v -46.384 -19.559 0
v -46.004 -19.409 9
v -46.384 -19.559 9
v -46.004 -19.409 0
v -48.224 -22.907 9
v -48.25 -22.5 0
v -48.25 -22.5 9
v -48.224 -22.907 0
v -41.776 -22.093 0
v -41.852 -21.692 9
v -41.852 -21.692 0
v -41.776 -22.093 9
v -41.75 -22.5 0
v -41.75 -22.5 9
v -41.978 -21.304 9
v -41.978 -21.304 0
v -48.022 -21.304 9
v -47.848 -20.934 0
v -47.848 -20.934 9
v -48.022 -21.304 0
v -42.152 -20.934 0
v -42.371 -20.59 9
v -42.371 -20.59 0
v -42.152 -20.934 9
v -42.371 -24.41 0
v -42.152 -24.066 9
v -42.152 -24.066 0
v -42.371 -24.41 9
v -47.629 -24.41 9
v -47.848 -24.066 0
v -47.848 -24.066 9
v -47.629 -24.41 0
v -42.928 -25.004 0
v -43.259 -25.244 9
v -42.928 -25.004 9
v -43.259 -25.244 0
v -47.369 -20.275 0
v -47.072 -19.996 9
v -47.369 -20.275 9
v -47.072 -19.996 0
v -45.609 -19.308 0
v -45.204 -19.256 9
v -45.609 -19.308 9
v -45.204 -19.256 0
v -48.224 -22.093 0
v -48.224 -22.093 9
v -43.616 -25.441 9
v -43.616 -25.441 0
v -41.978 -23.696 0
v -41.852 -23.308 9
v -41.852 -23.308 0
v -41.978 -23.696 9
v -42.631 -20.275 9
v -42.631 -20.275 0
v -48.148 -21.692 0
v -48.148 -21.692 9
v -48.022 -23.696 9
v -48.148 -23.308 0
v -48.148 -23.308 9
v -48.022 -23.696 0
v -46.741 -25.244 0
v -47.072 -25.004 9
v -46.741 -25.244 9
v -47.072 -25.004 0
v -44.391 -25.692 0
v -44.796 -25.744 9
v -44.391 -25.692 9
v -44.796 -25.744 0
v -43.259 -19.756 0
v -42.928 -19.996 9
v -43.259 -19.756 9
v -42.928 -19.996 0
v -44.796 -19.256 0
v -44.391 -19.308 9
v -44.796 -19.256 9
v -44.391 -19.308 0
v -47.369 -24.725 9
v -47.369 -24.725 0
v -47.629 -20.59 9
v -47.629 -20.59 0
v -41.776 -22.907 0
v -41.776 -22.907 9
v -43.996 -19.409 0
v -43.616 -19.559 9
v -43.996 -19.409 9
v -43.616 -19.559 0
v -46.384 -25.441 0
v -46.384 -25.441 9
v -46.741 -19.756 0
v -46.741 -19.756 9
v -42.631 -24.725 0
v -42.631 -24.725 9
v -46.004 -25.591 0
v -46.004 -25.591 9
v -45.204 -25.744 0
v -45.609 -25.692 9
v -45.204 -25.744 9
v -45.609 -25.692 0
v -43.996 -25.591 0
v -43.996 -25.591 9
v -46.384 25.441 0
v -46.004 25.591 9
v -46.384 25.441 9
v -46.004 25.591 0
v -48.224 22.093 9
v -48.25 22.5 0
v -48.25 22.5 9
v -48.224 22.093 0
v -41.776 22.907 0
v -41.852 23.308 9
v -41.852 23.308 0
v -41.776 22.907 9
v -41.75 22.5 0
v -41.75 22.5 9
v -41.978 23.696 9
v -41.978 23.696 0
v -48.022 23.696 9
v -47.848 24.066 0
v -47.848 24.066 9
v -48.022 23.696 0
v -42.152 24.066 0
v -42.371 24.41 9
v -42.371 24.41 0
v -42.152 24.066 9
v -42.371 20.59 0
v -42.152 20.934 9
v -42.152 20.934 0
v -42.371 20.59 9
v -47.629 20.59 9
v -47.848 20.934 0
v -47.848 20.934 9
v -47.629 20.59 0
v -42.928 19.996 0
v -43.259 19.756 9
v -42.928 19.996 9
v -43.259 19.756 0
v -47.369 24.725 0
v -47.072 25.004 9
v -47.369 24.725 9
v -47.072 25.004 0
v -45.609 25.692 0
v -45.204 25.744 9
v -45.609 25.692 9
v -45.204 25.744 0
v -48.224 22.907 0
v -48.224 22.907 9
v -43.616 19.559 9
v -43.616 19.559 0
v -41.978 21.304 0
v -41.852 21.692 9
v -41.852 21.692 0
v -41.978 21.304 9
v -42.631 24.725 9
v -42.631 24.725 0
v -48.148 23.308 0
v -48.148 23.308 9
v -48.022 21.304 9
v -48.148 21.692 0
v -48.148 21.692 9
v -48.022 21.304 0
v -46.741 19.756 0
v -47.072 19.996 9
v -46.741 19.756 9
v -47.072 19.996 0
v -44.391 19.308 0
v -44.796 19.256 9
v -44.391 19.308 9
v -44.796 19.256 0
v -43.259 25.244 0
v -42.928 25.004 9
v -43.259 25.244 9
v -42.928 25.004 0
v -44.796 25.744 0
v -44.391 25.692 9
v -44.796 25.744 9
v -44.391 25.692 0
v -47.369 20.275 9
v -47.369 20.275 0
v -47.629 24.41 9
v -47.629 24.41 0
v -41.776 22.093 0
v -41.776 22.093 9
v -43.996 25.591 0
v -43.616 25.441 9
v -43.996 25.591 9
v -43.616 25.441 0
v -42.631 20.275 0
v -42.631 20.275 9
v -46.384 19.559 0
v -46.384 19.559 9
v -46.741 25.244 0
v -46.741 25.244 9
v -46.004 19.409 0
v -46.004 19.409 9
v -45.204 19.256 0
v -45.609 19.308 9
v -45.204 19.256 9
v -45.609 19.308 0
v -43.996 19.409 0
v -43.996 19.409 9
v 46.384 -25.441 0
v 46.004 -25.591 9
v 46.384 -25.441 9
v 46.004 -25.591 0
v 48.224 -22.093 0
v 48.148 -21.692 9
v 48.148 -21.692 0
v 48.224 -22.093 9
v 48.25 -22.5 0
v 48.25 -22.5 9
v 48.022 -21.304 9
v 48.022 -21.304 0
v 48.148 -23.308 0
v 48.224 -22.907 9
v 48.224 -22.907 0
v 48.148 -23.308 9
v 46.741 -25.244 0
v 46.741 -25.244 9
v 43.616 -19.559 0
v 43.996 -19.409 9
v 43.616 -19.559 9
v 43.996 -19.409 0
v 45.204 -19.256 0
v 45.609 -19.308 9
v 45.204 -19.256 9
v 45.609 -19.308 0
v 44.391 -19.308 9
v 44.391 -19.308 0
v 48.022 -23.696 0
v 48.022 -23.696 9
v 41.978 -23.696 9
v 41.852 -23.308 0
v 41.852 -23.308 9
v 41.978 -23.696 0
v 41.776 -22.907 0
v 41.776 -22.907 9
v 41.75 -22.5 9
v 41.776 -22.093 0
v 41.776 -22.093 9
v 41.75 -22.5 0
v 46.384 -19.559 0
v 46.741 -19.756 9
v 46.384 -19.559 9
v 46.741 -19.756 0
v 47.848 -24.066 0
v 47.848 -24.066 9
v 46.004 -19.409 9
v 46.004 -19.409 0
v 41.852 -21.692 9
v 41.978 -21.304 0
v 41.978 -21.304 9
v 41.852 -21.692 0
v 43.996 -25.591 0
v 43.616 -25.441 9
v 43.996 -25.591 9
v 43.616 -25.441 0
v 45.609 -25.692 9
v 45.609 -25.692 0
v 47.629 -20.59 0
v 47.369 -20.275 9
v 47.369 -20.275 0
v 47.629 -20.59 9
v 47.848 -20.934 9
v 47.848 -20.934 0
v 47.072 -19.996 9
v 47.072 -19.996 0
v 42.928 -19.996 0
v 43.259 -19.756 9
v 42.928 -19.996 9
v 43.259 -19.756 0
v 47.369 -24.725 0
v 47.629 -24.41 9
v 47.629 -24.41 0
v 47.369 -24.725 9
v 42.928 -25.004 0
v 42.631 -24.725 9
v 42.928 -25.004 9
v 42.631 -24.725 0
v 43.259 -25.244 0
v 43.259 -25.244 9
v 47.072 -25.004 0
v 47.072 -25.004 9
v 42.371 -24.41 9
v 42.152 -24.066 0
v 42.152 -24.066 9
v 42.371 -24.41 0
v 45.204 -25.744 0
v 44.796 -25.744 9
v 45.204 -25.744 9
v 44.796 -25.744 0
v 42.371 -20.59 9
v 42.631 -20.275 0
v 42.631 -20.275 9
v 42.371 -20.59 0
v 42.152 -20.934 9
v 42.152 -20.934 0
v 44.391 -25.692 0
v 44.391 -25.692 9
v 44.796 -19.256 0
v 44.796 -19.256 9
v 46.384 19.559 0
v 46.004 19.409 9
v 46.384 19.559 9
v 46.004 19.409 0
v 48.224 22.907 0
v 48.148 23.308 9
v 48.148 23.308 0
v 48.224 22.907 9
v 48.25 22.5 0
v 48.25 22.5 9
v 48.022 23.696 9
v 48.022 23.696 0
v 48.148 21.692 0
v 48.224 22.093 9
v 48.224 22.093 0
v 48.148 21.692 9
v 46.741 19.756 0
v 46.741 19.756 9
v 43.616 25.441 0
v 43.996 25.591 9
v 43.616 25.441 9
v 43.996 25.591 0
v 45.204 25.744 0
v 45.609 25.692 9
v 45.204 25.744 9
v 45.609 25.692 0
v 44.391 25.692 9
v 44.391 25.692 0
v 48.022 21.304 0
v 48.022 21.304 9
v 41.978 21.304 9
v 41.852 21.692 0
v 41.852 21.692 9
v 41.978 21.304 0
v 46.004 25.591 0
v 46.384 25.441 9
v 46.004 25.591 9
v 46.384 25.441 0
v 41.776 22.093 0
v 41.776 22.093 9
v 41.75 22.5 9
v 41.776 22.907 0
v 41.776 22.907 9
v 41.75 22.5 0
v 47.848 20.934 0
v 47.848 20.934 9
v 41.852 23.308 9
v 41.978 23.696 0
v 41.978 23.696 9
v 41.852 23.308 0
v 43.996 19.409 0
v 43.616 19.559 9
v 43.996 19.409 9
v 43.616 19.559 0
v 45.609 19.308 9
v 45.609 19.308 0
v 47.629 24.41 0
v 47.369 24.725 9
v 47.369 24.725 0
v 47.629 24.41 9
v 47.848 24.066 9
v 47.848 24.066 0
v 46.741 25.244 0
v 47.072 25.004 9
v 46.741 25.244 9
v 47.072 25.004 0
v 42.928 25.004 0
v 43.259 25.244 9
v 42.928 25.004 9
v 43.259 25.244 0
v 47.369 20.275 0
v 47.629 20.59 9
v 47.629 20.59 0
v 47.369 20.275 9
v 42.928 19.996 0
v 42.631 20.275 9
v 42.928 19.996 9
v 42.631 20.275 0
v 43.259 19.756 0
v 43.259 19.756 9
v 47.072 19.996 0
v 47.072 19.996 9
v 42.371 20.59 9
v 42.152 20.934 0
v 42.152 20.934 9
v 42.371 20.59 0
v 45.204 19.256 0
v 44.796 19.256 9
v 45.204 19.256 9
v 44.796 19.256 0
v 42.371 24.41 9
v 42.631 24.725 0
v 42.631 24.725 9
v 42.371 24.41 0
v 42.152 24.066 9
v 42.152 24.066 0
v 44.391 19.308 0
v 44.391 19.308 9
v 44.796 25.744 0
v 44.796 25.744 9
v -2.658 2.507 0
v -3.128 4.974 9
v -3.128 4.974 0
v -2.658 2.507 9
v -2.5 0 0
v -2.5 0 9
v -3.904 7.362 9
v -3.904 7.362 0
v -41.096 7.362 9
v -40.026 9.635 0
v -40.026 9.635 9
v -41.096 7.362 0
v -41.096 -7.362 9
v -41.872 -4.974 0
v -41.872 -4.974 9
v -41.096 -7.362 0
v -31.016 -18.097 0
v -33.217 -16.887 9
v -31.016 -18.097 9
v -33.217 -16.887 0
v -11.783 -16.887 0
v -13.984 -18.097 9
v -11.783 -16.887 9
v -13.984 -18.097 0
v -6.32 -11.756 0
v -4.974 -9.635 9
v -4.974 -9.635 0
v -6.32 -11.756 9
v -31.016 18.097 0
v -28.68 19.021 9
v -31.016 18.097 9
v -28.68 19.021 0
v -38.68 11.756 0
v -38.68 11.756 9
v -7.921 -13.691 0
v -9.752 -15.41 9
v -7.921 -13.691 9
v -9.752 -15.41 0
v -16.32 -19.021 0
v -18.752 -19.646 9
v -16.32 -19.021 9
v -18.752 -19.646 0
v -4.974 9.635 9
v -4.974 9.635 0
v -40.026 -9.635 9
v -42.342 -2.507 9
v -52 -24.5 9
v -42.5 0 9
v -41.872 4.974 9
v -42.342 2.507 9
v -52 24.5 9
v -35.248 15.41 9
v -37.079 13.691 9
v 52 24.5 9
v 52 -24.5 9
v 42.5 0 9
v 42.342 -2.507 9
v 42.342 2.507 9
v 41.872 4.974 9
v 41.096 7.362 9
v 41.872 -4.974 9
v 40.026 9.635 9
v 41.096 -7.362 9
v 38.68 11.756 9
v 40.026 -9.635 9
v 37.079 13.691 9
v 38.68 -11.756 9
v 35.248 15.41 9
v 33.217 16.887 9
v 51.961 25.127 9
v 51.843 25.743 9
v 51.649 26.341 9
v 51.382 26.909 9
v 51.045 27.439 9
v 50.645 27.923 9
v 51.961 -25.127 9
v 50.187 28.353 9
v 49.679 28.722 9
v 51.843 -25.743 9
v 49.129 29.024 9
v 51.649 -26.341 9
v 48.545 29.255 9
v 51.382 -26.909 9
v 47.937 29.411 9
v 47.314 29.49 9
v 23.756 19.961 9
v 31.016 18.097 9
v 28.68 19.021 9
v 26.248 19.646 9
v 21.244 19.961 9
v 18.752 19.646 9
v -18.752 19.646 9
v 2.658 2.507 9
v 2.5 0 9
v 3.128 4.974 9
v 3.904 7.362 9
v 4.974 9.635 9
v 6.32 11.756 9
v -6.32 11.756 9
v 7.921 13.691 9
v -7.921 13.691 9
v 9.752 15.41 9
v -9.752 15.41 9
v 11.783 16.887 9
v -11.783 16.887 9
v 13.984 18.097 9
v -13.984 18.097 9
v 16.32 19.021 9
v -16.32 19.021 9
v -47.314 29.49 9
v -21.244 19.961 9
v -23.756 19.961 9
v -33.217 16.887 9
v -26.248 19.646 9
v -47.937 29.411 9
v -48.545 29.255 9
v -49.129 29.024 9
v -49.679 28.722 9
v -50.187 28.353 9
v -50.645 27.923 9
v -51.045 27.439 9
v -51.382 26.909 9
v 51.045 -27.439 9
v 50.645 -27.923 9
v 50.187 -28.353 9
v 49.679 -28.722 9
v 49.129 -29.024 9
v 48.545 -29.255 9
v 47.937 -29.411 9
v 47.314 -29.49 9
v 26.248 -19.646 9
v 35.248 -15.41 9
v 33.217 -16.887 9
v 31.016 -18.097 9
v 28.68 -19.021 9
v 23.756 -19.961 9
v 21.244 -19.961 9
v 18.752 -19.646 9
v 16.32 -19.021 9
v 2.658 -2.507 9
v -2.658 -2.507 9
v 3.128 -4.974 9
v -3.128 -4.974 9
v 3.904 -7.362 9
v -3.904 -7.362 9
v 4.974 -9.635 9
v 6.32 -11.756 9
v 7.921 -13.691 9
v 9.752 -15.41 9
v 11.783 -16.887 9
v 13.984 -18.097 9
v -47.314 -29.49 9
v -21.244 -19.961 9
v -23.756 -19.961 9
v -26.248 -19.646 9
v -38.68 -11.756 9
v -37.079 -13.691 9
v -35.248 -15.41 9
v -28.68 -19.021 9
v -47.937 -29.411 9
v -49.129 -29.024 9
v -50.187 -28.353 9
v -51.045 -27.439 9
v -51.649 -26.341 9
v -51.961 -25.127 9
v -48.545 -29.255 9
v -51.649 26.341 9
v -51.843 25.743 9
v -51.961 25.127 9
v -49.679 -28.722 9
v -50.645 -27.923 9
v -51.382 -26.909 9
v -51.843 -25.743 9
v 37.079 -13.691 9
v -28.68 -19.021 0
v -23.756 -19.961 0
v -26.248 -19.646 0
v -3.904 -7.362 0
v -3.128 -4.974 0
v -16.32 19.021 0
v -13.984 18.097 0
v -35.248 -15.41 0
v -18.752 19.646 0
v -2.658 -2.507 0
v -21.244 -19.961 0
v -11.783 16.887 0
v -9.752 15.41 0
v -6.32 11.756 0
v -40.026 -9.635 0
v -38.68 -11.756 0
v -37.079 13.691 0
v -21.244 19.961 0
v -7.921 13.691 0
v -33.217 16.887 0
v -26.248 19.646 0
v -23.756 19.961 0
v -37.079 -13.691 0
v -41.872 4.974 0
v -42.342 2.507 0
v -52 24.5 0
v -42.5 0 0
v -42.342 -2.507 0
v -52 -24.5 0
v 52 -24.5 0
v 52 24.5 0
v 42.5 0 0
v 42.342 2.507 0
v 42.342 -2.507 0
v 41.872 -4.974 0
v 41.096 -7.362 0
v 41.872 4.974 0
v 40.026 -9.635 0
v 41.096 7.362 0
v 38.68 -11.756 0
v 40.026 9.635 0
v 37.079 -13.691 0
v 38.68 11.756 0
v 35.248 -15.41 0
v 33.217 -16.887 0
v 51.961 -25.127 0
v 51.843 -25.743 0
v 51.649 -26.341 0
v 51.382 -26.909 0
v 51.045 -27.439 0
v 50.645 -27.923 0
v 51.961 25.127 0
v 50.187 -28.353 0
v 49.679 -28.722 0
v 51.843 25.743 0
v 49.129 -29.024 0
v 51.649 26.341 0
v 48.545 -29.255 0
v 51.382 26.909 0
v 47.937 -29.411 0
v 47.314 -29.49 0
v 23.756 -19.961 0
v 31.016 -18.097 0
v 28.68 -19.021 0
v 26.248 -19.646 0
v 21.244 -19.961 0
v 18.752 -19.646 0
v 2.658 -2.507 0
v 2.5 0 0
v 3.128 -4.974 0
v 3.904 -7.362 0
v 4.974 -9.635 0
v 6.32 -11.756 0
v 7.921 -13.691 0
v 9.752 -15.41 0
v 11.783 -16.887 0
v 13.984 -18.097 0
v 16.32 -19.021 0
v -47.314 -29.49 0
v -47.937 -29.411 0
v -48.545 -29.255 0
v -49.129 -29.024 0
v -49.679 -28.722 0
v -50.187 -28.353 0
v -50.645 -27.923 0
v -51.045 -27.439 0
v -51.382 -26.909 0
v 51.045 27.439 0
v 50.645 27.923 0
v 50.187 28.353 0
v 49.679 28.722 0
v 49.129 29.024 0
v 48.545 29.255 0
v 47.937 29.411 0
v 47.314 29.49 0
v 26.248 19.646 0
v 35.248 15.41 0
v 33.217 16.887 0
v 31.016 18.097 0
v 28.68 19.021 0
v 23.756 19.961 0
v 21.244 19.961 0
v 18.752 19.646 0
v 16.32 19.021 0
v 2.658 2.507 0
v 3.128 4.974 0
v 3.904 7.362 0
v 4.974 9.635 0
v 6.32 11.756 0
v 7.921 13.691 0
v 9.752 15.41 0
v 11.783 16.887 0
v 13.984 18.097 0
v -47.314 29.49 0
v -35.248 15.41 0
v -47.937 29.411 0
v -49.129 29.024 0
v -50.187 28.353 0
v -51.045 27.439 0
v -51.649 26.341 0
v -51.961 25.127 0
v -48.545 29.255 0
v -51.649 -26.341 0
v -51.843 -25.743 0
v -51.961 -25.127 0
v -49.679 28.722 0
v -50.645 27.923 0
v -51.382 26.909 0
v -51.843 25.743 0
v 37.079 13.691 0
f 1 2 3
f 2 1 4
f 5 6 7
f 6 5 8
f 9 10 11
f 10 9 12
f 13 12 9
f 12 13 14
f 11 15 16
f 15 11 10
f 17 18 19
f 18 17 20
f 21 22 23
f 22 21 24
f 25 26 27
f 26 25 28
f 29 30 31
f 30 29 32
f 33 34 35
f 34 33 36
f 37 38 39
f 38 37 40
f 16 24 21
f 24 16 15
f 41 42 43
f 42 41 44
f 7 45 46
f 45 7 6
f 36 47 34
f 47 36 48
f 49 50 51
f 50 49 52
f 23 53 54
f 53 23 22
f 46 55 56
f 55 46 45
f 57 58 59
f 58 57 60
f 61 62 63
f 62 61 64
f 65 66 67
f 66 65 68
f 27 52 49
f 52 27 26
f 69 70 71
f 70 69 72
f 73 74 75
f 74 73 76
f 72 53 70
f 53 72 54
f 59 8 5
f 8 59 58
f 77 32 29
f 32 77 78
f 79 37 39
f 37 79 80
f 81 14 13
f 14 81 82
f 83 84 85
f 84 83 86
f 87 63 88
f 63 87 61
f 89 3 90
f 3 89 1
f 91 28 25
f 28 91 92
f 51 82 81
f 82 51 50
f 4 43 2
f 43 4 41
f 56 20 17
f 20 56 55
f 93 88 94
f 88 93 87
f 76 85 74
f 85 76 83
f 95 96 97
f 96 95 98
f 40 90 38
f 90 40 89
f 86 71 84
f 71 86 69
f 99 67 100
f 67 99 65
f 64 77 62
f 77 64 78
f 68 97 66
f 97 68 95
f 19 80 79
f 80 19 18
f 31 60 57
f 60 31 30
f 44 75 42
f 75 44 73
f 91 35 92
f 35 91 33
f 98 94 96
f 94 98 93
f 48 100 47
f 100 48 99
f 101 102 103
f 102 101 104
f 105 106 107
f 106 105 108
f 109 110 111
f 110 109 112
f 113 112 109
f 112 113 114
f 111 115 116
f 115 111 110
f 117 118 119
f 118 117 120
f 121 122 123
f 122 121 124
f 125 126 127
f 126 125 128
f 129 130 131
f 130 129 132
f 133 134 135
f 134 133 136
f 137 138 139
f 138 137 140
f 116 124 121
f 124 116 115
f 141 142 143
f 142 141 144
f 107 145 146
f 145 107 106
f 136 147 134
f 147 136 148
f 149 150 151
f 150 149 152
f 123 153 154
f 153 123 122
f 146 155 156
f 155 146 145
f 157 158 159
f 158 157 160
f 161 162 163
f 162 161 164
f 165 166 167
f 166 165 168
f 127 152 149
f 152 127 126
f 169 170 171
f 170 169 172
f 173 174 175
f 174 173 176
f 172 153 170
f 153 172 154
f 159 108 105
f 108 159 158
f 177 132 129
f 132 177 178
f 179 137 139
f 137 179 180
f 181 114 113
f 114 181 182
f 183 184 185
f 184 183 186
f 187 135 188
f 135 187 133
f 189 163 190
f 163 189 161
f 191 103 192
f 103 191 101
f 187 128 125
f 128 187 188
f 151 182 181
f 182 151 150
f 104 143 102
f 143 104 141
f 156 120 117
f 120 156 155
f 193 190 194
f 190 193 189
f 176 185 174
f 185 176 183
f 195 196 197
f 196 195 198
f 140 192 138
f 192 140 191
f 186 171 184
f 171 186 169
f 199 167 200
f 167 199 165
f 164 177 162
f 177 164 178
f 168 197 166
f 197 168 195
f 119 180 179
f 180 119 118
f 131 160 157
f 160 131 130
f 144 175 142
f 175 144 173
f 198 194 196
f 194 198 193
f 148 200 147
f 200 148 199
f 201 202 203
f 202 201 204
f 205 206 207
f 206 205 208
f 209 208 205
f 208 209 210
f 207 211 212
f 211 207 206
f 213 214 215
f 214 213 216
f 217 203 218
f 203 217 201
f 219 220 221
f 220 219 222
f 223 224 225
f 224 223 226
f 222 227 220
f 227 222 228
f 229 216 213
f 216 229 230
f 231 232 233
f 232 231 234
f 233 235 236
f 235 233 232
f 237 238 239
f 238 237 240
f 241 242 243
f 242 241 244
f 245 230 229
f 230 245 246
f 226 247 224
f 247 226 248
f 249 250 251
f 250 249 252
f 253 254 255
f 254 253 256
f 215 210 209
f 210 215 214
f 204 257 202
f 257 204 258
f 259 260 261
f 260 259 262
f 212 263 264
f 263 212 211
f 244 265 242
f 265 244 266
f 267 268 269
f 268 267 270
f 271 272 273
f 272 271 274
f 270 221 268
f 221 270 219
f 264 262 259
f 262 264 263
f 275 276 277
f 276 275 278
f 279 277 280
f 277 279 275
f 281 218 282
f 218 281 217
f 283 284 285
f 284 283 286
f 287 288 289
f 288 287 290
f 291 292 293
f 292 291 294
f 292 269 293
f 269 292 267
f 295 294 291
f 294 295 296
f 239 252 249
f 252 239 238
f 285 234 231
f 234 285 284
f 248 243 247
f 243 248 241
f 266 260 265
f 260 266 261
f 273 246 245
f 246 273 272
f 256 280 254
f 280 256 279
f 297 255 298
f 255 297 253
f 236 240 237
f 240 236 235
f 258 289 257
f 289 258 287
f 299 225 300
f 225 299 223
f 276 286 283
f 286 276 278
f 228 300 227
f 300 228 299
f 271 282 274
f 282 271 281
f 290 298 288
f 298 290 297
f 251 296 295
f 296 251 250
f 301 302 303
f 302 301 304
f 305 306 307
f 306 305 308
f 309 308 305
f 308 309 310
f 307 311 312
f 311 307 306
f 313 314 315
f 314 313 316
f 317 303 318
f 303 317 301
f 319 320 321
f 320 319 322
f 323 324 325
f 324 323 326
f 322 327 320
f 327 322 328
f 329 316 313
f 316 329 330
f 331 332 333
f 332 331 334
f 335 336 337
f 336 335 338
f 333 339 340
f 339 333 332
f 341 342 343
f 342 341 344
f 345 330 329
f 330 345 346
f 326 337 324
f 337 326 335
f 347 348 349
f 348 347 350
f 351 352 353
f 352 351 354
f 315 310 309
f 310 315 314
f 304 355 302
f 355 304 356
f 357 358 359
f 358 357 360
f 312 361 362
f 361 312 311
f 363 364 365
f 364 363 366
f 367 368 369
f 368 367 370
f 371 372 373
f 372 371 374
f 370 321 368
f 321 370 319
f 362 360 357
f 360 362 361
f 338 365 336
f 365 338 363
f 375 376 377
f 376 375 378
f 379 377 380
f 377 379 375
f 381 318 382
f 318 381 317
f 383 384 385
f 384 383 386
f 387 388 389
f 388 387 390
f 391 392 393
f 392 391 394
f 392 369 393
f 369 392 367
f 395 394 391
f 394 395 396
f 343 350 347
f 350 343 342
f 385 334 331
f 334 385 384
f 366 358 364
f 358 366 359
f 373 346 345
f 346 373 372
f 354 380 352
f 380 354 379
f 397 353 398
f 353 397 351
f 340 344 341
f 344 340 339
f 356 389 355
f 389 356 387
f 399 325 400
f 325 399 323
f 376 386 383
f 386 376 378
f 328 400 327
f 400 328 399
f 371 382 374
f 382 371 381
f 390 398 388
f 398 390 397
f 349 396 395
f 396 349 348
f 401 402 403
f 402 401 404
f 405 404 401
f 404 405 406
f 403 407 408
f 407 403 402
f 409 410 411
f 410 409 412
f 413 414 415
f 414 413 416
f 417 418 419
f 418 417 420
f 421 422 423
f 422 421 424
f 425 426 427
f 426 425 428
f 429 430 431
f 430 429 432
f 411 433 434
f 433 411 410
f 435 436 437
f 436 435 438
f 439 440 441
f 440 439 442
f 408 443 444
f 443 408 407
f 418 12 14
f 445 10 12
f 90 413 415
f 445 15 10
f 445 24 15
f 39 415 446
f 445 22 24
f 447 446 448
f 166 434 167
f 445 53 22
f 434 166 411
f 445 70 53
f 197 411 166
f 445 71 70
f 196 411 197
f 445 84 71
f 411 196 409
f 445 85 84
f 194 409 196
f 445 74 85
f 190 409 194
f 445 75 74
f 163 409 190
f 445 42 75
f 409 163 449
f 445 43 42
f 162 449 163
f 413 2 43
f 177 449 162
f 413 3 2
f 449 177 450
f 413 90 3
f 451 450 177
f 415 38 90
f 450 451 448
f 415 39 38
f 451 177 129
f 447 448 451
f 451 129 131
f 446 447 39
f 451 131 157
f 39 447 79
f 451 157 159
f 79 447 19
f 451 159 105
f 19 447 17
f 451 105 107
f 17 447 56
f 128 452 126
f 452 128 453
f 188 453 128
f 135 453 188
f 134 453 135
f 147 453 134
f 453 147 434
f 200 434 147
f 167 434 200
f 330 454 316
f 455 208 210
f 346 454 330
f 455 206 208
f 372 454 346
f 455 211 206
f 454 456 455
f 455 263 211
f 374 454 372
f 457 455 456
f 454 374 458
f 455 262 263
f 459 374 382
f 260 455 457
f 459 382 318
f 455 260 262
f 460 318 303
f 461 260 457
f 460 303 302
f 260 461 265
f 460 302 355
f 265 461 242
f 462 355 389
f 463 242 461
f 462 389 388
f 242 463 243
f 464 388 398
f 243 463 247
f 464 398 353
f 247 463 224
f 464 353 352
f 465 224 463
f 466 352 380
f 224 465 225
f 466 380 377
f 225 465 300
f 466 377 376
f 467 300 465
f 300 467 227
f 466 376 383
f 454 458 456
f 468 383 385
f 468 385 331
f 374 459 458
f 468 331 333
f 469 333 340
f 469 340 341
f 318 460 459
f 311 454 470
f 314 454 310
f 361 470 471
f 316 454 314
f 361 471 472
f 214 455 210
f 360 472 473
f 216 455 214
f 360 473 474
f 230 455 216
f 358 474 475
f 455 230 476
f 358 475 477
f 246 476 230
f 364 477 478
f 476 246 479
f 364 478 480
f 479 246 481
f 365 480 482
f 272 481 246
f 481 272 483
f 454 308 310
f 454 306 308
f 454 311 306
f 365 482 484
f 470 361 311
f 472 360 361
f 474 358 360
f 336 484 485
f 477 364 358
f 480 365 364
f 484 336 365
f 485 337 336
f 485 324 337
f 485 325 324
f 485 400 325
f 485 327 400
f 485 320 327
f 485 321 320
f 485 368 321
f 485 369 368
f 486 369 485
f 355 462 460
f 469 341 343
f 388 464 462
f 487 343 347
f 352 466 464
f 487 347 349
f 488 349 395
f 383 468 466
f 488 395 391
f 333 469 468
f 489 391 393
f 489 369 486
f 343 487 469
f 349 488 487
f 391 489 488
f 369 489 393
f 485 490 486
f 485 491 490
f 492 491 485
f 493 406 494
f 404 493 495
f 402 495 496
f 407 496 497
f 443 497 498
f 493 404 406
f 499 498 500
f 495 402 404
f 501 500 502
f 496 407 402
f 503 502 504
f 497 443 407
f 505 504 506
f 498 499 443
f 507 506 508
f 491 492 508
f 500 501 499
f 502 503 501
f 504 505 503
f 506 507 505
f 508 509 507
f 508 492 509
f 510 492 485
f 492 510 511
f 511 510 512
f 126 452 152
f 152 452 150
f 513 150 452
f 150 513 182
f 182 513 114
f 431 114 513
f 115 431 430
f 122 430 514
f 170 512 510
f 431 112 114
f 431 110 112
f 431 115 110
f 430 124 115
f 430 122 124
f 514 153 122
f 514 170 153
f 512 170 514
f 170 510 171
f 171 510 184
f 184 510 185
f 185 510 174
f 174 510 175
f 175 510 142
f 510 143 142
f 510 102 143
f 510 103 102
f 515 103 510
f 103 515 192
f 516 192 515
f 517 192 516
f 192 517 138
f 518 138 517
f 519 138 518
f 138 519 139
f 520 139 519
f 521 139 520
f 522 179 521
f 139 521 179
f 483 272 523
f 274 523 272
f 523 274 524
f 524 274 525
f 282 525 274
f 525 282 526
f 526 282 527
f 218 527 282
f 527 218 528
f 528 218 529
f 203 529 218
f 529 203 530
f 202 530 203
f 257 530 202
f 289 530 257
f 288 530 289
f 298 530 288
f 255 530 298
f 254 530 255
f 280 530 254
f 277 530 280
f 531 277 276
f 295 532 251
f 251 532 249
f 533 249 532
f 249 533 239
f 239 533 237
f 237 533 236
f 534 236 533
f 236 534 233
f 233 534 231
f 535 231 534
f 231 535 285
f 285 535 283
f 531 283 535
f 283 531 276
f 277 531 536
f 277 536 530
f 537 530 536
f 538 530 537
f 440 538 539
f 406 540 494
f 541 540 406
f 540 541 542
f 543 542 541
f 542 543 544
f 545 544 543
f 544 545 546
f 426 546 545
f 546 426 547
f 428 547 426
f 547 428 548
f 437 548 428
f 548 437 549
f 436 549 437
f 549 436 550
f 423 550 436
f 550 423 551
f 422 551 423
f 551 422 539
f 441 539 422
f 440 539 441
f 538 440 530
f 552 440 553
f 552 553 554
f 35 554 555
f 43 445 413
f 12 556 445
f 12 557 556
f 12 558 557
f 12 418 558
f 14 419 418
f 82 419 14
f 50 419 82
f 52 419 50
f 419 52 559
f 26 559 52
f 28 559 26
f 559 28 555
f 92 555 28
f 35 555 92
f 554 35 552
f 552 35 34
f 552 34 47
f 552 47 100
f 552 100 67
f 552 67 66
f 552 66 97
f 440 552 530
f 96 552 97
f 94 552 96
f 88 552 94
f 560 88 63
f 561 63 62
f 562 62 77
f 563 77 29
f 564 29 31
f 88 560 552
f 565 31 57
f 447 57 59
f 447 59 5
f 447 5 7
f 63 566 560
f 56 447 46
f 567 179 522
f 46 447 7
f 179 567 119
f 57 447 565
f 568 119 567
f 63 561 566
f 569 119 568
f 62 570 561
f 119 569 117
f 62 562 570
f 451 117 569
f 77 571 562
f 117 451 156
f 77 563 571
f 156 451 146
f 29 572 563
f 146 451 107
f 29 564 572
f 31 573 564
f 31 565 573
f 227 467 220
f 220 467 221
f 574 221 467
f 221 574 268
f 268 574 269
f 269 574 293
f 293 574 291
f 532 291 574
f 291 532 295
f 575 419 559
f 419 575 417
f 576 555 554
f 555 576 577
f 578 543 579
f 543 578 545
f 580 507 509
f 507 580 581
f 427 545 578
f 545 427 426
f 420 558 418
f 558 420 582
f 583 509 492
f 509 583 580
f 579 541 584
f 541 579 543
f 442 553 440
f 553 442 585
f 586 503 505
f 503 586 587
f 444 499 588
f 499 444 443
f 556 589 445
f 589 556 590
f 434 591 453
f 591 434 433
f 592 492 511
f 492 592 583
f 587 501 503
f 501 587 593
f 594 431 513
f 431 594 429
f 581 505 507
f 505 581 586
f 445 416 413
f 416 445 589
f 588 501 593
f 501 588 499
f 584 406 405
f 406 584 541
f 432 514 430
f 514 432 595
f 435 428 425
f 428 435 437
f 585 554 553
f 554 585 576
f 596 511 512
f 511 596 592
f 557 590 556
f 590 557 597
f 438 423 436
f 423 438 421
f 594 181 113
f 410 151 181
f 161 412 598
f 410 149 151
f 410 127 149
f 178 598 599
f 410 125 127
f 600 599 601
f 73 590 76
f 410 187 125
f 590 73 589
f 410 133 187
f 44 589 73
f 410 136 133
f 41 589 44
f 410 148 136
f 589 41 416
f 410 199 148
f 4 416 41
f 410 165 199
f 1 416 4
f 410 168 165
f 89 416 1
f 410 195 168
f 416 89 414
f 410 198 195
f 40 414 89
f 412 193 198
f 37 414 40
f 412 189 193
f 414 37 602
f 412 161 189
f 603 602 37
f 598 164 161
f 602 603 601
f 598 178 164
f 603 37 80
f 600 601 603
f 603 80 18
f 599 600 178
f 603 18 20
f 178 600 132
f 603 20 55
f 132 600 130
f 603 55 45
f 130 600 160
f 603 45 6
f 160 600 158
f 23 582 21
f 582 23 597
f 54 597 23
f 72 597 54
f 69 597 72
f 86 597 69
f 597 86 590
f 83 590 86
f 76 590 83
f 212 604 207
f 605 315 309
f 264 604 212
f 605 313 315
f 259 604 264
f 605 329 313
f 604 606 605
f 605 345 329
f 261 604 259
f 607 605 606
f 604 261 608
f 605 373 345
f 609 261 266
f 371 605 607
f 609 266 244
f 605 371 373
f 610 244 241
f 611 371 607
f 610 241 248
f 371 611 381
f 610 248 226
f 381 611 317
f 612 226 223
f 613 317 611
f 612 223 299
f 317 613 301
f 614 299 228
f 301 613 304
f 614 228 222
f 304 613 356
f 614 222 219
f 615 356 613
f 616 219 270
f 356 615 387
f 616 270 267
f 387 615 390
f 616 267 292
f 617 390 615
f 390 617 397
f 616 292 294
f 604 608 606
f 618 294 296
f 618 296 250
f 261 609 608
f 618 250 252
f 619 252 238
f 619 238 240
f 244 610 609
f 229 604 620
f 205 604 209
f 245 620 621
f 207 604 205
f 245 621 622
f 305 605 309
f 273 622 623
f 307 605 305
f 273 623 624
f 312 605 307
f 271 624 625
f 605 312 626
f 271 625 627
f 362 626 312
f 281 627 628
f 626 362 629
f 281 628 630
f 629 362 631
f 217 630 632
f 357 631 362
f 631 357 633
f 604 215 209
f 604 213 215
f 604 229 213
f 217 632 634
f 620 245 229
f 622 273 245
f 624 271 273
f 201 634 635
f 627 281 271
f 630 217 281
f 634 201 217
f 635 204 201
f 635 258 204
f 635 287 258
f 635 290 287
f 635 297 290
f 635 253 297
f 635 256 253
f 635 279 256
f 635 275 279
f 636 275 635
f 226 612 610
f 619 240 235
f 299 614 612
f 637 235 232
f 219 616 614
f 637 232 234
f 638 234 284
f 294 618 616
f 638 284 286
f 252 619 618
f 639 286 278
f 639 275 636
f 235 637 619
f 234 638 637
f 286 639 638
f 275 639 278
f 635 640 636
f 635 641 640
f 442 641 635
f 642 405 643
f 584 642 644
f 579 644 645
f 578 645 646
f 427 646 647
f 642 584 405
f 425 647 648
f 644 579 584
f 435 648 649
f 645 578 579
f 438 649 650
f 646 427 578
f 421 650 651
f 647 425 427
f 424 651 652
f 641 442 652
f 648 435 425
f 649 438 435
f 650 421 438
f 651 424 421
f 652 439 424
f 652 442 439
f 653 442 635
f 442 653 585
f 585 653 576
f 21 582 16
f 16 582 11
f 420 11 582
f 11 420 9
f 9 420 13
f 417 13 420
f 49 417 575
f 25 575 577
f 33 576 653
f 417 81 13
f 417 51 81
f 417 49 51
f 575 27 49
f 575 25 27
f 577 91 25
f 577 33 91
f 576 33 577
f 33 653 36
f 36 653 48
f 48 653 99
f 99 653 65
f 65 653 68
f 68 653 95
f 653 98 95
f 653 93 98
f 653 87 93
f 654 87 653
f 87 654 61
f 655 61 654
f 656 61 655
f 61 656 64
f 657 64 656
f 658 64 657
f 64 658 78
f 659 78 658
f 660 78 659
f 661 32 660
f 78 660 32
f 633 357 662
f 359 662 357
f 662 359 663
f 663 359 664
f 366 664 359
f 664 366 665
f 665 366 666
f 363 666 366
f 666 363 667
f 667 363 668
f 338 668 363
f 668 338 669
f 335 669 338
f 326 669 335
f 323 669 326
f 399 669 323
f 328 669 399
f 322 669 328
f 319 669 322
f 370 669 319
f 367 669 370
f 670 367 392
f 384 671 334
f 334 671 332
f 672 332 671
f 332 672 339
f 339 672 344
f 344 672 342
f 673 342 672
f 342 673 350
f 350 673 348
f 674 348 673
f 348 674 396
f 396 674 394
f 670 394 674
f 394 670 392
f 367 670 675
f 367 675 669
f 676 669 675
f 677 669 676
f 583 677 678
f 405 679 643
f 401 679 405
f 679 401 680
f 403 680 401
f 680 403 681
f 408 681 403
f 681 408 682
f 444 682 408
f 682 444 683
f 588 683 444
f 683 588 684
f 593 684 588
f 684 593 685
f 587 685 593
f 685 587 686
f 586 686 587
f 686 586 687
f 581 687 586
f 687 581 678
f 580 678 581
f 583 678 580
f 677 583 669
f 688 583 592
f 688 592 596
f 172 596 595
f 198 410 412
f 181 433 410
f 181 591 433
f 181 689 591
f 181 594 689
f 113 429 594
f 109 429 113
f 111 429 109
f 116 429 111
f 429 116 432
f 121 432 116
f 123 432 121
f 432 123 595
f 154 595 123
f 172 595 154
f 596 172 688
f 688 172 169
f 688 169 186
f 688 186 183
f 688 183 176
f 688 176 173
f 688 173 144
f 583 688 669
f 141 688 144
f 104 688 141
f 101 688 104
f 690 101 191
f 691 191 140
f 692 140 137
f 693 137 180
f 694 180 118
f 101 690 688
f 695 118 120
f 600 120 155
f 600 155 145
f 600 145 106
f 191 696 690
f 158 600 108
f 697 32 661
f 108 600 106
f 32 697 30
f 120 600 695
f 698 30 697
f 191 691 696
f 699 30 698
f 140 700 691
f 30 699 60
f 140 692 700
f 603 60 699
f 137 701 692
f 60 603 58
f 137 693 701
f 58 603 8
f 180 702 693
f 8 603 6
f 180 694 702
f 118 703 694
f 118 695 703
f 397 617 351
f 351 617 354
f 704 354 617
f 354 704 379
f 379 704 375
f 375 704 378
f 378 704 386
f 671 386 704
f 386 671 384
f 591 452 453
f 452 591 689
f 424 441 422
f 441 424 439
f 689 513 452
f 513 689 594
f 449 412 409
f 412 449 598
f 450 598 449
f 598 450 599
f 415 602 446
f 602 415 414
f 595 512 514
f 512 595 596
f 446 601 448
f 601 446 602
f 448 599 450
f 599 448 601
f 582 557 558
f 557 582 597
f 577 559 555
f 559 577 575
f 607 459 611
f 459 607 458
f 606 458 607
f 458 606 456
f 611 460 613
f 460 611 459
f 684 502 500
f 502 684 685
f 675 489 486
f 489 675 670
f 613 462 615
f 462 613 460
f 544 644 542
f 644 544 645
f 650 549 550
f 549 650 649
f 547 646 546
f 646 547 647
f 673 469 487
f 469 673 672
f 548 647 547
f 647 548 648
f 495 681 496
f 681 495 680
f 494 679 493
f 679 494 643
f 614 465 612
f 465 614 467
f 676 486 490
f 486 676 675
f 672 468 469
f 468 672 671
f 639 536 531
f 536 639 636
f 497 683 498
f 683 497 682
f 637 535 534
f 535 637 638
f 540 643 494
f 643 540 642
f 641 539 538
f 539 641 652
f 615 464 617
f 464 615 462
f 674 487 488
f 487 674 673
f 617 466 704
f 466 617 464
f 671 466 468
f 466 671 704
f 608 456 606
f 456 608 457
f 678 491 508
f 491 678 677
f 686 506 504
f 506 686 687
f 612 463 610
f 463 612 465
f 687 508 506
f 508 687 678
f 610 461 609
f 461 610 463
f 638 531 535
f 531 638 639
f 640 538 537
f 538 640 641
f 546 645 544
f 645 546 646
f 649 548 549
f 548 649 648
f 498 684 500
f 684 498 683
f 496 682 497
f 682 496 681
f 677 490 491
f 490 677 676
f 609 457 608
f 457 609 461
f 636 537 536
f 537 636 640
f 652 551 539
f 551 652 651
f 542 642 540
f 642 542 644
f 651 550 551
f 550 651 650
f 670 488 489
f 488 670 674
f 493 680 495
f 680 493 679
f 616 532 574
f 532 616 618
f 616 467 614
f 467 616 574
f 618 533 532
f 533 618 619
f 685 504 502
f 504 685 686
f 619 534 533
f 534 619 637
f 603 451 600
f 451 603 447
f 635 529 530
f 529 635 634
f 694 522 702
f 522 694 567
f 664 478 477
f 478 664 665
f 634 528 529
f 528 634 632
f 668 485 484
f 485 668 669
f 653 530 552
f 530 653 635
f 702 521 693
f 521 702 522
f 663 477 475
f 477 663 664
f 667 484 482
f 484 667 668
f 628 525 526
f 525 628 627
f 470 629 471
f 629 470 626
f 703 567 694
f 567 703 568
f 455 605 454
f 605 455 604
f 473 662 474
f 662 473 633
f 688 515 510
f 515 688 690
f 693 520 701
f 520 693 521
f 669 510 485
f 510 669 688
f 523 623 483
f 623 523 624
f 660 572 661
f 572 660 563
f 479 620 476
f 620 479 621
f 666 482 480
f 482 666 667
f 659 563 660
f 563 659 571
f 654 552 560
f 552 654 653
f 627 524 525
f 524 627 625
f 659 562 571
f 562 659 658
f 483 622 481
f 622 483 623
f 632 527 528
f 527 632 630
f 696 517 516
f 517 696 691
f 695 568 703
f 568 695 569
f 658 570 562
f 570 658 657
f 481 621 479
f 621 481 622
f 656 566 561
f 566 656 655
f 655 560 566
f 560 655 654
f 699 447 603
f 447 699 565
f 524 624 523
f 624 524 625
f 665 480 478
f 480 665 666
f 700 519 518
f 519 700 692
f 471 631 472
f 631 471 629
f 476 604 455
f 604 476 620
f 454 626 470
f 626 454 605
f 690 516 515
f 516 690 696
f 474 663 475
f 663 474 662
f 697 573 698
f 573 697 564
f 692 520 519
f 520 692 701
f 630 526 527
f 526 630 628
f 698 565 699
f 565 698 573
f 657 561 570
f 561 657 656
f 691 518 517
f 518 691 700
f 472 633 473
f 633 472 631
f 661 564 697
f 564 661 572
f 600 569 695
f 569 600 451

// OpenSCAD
$fn = 50;

difference() {
	union() {
		hull() {
			translate(v = [-47.0, 24.5, 0]) {
				cylinder(h = 9, r = 5);
			}
			translate(v = [47.0, 24.5, 0]) {
				cylinder(h = 9, r = 5);
			}
			translate(v = [-47.0, -24.5, 0]) {
				cylinder(h = 9, r = 5);
			}
			translate(v = [47.0, -24.5, 0]) {
				cylinder(h = 9, r = 5);
			}
		}
	}
	union() {
		translate(v = [-45.0, -22.5, -100.0]) {
			cylinder(h = 200, r = 3.25);
		}
		translate(v = [-45.0, 22.5, -100.0]) {
			cylinder(h = 200, r = 3.25);
		}
		translate(v = [45.0, -22.5, -100.0]) {
			cylinder(h = 200, r = 3.25);
		}
		translate(v = [45.0, 22.5, -100.0]) {
			cylinder(h = 200, r = 3.25);
		}
		translate(v = [-45.0, -22.5, -100.0]) {
			cylinder(h = 200, r = 1.8);
		}
		translate(v = [-45.0, 22.5, -100.0]) {
			cylinder(h = 200, r = 1.8);
		}
		translate(v = [45.0, -22.5, -100.0]) {
			cylinder(h = 200, r = 1.8);
		}
		translate(v = [45.0, 22.5, -100.0]) {
			cylinder(h = 200, r = 1.8);
		}
		translate(v = [-22.5, 0, 0.0]) {
			cylinder(h = 9, r = 20.0);
		}
		translate(v = [22.5, 0, 0.0]) {
			cylinder(h = 9, r = 20.0);
		}
	}
}
